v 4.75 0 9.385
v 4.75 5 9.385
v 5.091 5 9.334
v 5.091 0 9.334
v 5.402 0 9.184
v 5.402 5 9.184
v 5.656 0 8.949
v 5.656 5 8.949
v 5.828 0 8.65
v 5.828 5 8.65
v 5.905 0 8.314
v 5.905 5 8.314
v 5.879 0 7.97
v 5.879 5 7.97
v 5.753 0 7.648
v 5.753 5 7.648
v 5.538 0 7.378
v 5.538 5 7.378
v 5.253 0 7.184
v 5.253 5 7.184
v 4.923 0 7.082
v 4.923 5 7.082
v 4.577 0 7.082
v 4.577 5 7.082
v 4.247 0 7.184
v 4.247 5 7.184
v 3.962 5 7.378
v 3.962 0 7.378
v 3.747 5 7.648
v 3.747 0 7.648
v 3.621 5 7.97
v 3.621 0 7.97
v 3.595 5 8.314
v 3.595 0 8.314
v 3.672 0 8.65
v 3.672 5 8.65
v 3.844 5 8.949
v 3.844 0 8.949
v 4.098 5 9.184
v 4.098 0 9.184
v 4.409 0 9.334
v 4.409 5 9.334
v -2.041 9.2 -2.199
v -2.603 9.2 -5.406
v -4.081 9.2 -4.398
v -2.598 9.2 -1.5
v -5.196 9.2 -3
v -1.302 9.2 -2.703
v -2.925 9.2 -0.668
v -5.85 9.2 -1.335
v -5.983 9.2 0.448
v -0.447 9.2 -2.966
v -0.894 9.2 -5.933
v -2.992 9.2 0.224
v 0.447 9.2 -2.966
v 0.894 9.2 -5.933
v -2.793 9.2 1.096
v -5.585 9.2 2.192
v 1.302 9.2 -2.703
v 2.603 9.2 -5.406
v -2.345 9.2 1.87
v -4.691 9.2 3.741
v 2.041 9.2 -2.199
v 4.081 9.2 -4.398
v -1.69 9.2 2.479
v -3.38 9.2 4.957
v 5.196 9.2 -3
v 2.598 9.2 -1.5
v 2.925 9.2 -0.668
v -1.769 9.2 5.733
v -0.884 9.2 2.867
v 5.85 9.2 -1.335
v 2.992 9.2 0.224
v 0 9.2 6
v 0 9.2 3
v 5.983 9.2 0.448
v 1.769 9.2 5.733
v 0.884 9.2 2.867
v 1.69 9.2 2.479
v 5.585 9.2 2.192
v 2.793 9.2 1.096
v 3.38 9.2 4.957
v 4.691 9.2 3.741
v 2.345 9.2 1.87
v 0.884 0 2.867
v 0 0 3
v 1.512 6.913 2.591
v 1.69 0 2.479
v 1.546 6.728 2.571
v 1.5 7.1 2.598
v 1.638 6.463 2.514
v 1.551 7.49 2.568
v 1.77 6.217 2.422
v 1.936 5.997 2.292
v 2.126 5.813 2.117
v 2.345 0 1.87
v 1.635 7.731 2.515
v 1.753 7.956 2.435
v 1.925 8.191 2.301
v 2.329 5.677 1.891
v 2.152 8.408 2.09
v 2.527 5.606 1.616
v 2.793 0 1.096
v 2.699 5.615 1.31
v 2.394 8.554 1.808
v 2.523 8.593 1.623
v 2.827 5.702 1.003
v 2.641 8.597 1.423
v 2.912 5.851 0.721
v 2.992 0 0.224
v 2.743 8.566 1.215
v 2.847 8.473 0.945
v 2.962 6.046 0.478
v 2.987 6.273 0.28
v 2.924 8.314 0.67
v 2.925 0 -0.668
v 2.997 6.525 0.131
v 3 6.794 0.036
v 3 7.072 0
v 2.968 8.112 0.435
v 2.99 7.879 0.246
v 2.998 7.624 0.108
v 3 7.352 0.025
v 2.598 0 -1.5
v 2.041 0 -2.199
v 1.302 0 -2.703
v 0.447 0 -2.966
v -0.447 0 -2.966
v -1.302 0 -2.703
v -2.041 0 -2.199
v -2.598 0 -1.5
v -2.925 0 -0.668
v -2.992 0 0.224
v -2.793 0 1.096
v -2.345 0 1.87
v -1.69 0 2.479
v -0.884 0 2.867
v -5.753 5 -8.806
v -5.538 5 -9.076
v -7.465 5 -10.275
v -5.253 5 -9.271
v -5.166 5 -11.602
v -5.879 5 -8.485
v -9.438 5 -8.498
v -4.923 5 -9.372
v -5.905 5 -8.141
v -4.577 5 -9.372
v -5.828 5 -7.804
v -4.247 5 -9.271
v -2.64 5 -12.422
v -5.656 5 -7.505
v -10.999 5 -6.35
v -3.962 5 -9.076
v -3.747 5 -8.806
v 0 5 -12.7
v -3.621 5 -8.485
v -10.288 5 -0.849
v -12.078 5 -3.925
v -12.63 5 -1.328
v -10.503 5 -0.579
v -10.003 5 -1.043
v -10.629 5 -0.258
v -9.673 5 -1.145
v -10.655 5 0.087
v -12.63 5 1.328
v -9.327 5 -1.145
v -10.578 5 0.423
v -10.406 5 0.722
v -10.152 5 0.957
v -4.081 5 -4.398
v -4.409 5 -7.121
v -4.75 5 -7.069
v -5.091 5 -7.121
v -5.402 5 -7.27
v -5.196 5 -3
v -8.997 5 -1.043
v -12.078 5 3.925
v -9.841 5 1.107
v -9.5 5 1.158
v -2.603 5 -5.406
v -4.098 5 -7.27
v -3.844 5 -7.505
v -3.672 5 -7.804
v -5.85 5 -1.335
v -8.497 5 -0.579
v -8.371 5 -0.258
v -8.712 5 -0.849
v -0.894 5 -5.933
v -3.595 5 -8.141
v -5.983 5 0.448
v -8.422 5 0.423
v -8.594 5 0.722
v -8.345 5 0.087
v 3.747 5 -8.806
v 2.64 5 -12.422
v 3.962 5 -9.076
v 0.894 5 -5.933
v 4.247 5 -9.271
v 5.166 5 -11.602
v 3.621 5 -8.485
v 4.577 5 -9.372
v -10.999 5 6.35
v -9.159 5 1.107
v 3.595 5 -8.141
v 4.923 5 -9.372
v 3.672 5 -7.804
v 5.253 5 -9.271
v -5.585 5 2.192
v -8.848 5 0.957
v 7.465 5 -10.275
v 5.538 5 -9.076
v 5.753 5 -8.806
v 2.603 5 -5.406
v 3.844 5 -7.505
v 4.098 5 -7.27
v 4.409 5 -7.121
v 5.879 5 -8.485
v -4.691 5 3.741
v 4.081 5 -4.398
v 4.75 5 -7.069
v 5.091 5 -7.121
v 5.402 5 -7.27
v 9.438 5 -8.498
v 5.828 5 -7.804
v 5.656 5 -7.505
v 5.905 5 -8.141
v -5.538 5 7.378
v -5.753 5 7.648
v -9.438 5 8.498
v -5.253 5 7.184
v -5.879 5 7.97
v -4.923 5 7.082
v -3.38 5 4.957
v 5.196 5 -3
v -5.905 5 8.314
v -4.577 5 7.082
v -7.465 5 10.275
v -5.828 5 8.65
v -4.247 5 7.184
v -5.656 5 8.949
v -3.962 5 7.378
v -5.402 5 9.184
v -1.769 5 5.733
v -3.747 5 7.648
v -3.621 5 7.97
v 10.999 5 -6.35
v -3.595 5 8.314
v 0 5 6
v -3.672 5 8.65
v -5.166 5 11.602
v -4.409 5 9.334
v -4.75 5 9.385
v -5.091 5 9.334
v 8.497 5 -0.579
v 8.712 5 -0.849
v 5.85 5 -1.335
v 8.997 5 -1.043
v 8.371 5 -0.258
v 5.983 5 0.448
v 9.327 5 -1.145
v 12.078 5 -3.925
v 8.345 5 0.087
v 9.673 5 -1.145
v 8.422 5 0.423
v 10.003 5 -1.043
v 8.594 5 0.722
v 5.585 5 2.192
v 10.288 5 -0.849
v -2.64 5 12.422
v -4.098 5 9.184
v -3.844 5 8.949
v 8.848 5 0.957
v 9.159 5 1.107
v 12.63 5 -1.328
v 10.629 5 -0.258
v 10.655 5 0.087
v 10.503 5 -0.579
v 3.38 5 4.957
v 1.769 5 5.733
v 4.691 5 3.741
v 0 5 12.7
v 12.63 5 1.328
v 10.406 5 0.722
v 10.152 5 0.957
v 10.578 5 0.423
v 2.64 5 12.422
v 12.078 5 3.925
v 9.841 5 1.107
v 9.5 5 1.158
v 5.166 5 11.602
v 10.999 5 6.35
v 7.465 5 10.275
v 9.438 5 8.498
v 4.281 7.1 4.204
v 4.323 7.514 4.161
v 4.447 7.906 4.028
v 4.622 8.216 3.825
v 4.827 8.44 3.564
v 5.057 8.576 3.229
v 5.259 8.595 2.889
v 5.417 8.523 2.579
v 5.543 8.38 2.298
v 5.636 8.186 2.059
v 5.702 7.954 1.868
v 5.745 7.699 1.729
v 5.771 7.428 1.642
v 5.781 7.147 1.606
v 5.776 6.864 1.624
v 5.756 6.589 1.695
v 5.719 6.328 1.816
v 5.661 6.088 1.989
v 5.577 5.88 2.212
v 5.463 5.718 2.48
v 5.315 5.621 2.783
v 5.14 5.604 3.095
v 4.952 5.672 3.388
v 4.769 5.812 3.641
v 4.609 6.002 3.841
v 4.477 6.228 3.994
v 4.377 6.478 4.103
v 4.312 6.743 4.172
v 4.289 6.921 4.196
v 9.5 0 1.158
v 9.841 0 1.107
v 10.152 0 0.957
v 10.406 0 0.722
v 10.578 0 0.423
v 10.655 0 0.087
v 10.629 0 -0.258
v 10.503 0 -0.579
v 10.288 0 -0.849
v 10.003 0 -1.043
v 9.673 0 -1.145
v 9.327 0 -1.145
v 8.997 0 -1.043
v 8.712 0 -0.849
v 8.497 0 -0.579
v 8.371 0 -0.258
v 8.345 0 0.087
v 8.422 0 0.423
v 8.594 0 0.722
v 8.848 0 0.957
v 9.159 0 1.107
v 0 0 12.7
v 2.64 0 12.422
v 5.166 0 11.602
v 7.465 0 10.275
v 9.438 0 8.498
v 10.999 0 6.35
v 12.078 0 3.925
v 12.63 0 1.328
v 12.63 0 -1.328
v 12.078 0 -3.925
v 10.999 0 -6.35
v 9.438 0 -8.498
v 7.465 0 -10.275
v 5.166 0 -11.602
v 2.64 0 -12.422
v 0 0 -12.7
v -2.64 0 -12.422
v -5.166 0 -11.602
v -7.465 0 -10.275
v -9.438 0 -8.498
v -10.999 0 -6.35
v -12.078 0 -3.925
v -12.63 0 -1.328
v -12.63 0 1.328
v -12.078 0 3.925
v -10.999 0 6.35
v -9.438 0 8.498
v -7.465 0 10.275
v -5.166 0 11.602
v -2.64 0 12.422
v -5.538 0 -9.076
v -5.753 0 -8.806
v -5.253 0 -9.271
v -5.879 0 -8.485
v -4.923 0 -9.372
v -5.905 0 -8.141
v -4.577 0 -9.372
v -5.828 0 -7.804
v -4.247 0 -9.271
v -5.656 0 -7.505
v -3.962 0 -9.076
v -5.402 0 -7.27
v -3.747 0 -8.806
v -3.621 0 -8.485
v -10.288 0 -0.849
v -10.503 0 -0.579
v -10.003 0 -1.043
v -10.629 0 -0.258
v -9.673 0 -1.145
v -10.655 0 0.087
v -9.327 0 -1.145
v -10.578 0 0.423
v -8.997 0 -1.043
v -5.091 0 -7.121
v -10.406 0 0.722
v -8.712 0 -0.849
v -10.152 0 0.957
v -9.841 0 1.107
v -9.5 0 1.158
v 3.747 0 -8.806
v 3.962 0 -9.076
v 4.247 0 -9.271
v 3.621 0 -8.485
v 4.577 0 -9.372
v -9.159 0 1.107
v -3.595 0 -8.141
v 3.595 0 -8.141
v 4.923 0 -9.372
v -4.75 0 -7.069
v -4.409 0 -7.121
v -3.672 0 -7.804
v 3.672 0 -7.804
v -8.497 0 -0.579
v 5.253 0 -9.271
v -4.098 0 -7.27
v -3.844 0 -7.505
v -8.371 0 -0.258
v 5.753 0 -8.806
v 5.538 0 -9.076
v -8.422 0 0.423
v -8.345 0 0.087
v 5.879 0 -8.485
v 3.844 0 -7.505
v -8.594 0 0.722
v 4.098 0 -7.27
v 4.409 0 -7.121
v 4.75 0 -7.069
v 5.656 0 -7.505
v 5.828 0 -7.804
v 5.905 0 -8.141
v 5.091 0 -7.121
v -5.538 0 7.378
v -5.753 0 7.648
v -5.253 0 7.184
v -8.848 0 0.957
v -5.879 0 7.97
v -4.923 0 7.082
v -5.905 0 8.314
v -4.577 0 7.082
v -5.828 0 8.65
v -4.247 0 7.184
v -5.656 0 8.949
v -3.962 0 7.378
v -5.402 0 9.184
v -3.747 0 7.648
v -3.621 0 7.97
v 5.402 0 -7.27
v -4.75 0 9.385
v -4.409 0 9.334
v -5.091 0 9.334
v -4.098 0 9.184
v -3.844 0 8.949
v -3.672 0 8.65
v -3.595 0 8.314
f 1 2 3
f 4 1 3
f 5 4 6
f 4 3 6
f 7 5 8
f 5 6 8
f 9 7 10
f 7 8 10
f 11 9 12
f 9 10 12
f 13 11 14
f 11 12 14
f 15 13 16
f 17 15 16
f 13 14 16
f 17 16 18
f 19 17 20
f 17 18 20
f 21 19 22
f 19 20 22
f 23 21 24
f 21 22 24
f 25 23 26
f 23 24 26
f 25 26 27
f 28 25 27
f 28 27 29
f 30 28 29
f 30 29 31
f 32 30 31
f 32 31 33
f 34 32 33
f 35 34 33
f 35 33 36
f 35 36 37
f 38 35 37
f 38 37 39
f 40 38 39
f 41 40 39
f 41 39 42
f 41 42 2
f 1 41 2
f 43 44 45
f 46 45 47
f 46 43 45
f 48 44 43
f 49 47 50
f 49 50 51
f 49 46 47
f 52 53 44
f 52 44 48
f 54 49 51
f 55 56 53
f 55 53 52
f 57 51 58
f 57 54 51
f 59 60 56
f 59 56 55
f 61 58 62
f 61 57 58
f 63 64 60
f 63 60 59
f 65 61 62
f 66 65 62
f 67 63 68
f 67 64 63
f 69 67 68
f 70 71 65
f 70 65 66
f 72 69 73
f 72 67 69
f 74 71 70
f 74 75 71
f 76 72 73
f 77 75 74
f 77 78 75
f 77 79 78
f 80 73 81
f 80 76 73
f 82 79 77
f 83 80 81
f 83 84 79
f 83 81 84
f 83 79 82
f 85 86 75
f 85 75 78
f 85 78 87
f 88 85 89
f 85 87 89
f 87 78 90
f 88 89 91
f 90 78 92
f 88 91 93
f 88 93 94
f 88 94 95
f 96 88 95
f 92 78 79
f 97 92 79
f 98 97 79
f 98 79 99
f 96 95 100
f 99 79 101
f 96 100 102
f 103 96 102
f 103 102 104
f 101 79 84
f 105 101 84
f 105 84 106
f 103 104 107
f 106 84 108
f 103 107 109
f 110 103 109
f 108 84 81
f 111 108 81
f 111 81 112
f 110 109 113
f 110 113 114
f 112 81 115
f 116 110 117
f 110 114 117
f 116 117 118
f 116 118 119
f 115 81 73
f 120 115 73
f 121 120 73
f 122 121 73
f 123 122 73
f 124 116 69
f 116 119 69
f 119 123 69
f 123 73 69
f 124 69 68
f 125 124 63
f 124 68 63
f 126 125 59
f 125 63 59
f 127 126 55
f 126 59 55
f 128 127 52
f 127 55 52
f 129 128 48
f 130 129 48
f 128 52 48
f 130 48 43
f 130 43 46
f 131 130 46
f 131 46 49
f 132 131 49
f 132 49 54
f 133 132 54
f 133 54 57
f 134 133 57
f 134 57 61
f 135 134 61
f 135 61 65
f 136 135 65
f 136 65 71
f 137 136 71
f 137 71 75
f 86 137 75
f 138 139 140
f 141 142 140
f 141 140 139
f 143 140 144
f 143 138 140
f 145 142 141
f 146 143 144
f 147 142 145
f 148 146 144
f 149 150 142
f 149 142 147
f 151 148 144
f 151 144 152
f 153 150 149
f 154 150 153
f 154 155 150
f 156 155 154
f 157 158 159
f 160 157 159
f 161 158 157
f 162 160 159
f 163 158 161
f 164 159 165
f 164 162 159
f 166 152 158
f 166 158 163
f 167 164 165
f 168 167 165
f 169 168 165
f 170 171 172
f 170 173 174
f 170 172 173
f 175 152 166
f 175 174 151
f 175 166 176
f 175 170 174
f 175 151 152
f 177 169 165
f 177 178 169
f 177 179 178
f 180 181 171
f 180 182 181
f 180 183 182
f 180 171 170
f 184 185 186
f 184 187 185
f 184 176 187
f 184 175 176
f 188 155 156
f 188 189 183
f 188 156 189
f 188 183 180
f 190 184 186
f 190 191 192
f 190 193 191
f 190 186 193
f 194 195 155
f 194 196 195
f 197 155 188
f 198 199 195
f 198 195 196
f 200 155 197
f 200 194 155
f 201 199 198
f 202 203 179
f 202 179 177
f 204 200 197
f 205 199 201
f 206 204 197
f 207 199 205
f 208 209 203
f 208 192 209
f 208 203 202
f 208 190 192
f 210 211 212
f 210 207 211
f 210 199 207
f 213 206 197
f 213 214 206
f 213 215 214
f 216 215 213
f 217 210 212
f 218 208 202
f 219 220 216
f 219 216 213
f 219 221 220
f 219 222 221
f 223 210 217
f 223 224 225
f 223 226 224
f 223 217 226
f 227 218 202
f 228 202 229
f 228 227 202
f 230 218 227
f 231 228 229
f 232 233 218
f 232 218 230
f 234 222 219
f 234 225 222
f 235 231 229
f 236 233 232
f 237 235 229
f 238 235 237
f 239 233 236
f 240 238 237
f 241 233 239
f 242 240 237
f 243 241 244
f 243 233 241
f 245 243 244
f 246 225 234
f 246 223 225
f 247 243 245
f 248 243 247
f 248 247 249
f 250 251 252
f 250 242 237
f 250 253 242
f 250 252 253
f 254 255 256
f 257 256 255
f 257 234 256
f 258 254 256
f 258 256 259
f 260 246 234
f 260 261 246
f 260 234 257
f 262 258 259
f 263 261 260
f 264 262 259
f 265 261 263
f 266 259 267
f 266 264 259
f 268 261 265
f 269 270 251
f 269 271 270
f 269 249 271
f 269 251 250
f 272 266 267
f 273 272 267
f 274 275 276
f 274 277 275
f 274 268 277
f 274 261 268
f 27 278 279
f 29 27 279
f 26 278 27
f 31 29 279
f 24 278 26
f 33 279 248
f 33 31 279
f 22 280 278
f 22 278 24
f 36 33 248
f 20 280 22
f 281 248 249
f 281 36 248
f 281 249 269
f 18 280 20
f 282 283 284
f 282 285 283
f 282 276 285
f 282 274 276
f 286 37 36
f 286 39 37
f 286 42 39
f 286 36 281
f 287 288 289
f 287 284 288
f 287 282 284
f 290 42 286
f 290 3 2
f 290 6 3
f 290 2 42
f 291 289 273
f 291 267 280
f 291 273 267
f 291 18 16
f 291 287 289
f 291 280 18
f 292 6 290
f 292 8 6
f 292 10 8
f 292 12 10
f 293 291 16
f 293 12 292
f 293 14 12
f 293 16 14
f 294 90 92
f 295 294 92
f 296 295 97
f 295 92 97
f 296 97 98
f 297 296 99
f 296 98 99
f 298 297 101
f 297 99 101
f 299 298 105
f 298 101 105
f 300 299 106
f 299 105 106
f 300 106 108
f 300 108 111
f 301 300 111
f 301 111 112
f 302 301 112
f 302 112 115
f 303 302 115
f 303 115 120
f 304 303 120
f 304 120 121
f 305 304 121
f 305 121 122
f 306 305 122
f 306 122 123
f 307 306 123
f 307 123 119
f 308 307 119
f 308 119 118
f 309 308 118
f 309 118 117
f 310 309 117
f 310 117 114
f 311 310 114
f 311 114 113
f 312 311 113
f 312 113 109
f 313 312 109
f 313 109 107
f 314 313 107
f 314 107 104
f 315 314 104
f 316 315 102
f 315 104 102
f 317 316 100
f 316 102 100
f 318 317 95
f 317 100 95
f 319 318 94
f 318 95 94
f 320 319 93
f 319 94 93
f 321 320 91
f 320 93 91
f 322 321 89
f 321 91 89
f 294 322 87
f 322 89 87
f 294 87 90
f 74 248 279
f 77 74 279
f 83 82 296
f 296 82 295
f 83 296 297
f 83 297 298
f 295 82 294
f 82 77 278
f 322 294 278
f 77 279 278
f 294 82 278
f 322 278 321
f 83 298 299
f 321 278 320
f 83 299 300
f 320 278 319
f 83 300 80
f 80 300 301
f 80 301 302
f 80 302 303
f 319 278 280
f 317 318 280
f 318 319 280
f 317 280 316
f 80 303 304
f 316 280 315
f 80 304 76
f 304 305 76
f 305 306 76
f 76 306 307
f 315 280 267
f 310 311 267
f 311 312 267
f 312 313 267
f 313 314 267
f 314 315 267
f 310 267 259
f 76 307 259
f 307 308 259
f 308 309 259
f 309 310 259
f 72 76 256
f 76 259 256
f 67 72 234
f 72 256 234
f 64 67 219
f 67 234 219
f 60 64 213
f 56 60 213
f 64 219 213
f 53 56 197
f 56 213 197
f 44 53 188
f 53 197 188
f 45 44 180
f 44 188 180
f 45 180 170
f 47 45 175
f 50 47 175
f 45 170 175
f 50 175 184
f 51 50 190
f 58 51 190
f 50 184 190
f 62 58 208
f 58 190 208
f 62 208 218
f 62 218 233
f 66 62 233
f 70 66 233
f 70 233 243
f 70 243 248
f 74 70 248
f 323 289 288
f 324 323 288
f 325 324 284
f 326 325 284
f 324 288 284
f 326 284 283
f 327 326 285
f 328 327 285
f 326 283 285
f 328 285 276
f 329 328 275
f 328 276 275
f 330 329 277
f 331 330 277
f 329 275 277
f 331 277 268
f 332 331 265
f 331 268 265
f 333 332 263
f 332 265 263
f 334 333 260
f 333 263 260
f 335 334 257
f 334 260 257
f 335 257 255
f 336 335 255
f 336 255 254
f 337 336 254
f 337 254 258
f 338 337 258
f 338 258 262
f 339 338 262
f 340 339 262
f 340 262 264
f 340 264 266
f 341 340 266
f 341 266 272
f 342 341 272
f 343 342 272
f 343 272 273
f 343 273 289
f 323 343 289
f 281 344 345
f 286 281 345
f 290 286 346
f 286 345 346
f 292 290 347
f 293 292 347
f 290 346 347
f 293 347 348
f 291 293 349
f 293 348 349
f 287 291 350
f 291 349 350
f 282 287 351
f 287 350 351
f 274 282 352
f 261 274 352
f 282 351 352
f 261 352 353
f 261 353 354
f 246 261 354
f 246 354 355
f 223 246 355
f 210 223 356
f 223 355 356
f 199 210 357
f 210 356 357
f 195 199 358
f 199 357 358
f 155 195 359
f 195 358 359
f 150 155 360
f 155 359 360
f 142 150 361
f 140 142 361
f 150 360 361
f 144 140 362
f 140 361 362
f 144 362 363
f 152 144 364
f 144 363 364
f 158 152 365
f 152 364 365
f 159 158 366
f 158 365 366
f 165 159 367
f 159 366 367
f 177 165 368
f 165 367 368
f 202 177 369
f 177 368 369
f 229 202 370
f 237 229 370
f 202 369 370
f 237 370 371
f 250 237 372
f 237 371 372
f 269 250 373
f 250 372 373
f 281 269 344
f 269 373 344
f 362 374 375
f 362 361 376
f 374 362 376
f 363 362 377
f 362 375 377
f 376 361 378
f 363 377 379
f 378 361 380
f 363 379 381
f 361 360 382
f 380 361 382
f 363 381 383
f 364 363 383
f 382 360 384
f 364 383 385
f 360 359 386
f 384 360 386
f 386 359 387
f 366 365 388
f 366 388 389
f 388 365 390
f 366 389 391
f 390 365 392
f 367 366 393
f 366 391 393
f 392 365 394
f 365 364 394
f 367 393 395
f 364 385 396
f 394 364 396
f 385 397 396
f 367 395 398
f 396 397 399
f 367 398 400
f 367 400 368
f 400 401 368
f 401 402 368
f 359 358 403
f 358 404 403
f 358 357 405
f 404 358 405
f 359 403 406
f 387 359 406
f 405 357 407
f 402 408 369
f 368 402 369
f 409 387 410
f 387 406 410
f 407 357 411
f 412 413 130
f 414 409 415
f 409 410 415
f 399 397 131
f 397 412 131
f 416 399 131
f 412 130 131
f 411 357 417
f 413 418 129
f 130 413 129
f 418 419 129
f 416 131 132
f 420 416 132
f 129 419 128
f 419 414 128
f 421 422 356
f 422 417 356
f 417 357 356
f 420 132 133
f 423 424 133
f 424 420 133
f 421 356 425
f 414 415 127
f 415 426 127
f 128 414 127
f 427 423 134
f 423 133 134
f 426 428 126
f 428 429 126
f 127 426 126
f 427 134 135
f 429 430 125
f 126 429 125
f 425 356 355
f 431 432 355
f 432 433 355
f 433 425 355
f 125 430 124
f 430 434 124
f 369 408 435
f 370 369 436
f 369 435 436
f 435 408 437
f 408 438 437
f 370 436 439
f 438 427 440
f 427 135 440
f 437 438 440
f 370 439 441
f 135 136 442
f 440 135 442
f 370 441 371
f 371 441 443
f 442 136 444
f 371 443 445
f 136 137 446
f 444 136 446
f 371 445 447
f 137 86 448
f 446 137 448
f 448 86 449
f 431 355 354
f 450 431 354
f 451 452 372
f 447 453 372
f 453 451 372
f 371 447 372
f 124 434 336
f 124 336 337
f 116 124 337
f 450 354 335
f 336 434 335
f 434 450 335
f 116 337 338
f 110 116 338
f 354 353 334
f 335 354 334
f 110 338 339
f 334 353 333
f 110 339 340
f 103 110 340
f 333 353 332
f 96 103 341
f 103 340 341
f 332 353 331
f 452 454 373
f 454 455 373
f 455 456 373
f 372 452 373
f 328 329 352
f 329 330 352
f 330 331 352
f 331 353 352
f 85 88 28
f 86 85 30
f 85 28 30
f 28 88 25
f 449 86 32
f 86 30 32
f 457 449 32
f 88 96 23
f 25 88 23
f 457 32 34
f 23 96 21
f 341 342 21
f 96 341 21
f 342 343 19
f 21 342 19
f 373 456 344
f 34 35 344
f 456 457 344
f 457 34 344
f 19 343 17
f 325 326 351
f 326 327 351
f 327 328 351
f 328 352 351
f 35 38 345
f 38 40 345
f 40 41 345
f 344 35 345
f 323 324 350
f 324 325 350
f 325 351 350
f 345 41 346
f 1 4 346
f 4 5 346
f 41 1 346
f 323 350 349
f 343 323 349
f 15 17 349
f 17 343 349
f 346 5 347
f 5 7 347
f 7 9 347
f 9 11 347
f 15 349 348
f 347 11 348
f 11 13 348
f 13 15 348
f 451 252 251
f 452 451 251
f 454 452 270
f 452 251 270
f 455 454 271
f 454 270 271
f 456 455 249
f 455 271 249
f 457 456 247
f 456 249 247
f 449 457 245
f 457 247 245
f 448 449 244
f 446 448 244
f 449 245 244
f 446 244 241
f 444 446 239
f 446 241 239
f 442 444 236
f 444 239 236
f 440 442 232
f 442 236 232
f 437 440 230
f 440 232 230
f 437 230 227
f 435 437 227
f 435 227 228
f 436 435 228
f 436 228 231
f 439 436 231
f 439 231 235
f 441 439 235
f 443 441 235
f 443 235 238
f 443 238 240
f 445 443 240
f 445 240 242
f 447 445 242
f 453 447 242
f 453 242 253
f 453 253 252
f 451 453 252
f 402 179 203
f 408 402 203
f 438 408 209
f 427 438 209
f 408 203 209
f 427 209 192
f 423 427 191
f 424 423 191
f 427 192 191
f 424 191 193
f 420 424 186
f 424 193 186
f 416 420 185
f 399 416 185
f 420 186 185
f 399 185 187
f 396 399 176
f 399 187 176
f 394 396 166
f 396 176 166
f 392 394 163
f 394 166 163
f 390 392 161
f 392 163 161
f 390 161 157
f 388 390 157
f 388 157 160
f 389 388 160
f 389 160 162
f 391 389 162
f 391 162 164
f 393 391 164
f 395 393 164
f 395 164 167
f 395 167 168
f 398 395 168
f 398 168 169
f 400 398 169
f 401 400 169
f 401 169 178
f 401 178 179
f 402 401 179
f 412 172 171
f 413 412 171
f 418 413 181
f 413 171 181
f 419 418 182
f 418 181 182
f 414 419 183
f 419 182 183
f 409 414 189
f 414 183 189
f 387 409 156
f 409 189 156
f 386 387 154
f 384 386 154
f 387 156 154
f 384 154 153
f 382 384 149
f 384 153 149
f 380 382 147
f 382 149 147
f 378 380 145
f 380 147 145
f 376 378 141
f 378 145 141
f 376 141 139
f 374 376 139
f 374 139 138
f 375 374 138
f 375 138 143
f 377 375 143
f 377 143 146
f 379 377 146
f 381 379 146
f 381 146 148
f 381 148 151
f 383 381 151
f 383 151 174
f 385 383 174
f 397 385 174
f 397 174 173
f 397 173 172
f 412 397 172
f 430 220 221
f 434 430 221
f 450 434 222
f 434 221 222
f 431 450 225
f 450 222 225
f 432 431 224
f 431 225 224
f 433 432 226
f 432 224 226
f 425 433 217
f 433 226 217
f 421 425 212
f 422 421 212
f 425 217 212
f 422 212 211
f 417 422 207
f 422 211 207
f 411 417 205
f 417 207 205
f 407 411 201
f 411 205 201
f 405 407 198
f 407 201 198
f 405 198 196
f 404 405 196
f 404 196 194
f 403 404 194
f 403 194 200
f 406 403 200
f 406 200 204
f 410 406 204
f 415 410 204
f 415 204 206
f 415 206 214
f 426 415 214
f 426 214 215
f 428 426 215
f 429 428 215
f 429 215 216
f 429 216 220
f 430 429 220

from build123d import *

# Parameters (mm, degrees)
SKETCH1_R           = 12.7
BOSS_EXTRUDE1_DEPTH = 5
SKETCH2_R           = 6
BOSS_EXTRUDE2_DEPTH = 4.2
SKETCH3_R           = 3
CUT_EXTRUDE1_DEPTH  = 21.179692763
SKETCH6_R           = 1.158179442
CUT_EXTRUDE2_DEPTH  = 19.643497526
SKETCH7_R           = 1.5
CUT_EXTRUDE3_DEPTH  = 8.2


with BuildPart() as part:
    # Sketch1 → Boss-Extrude1 (new body)
    with BuildSketch(Plane(origin=(0, 0, 0), x_dir=(1, 0, 0), z_dir=(0, 1, 0))):
        with Locations(Location((0, 0, 0), (0, 0, 270))):
            Circle(SKETCH1_R)
    extrude(amount=BOSS_EXTRUDE1_DEPTH)

    # Sketch2 → Boss-Extrude2 (add)
    with BuildSketch(Plane(origin=(0, 5, 0), x_dir=(1, 0, 0), z_dir=(0, 1, 0))):
        with Locations(Location((0, 0, 0), (0, 0, 270))):
            Circle(SKETCH2_R)
    extrude(amount=BOSS_EXTRUDE2_DEPTH)

    # Sketch3 → Cut-Extrude1 (cut, through all)
    with BuildSketch(Plane(origin=(0, 9.2, 0), x_dir=(1, 0, 0), z_dir=(0, 1, 0))):
        with Locations(Location((0, 0, 0), (0, 0, 270))):
            Circle(SKETCH3_R)
    extrude(amount=-CUT_EXTRUDE1_DEPTH, mode=Mode.SUBTRACT)

    # Sketch6 → Cut-Extrude2 (cut, through all)
    with BuildSketch(Plane(origin=(0, 5, 0), x_dir=(1, 0, 0), z_dir=(0, 1, 0))):
        with Locations(Location((-9.5, 0, 0), (0, 0, 270))):
            Circle(SKETCH6_R)
        with Locations(Location((-4.75, 8.227241336, 0), (0, 0, 270))):
            Circle(SKETCH6_R)
        with Locations(Location((4.75, 8.227241336, 0), (0, 0, 270))):
            Circle(SKETCH6_R)
        with Locations(Location((9.5, 0, 0), (0, 0, 270))):
            Circle(SKETCH6_R)
        with Locations(Location((4.75, -8.227241336, 0), (0, 0, 270))):
            Circle(SKETCH6_R)
        with Locations(Location((-4.75, -8.227241336, 0), (0, 0, 270))):
            Circle(SKETCH6_R)
    extrude(amount=-CUT_EXTRUDE2_DEPTH, mode=Mode.SUBTRACT)

    # Sketch7 → Cut-Extrude3 (cut)
    with BuildSketch(Plane(origin=(0, 5, 0), x_dir=(-0.5000000000000102, 0, 0.8660254037844328), z_dir=(-0.8660254037844328, 0, -0.5000000000000102))):
        with Locations((0, 2.1)):
            Circle(SKETCH7_R)
    extrude(amount=-CUT_EXTRUDE3_DEPTH, mode=Mode.SUBTRACT)


solid = part.part
